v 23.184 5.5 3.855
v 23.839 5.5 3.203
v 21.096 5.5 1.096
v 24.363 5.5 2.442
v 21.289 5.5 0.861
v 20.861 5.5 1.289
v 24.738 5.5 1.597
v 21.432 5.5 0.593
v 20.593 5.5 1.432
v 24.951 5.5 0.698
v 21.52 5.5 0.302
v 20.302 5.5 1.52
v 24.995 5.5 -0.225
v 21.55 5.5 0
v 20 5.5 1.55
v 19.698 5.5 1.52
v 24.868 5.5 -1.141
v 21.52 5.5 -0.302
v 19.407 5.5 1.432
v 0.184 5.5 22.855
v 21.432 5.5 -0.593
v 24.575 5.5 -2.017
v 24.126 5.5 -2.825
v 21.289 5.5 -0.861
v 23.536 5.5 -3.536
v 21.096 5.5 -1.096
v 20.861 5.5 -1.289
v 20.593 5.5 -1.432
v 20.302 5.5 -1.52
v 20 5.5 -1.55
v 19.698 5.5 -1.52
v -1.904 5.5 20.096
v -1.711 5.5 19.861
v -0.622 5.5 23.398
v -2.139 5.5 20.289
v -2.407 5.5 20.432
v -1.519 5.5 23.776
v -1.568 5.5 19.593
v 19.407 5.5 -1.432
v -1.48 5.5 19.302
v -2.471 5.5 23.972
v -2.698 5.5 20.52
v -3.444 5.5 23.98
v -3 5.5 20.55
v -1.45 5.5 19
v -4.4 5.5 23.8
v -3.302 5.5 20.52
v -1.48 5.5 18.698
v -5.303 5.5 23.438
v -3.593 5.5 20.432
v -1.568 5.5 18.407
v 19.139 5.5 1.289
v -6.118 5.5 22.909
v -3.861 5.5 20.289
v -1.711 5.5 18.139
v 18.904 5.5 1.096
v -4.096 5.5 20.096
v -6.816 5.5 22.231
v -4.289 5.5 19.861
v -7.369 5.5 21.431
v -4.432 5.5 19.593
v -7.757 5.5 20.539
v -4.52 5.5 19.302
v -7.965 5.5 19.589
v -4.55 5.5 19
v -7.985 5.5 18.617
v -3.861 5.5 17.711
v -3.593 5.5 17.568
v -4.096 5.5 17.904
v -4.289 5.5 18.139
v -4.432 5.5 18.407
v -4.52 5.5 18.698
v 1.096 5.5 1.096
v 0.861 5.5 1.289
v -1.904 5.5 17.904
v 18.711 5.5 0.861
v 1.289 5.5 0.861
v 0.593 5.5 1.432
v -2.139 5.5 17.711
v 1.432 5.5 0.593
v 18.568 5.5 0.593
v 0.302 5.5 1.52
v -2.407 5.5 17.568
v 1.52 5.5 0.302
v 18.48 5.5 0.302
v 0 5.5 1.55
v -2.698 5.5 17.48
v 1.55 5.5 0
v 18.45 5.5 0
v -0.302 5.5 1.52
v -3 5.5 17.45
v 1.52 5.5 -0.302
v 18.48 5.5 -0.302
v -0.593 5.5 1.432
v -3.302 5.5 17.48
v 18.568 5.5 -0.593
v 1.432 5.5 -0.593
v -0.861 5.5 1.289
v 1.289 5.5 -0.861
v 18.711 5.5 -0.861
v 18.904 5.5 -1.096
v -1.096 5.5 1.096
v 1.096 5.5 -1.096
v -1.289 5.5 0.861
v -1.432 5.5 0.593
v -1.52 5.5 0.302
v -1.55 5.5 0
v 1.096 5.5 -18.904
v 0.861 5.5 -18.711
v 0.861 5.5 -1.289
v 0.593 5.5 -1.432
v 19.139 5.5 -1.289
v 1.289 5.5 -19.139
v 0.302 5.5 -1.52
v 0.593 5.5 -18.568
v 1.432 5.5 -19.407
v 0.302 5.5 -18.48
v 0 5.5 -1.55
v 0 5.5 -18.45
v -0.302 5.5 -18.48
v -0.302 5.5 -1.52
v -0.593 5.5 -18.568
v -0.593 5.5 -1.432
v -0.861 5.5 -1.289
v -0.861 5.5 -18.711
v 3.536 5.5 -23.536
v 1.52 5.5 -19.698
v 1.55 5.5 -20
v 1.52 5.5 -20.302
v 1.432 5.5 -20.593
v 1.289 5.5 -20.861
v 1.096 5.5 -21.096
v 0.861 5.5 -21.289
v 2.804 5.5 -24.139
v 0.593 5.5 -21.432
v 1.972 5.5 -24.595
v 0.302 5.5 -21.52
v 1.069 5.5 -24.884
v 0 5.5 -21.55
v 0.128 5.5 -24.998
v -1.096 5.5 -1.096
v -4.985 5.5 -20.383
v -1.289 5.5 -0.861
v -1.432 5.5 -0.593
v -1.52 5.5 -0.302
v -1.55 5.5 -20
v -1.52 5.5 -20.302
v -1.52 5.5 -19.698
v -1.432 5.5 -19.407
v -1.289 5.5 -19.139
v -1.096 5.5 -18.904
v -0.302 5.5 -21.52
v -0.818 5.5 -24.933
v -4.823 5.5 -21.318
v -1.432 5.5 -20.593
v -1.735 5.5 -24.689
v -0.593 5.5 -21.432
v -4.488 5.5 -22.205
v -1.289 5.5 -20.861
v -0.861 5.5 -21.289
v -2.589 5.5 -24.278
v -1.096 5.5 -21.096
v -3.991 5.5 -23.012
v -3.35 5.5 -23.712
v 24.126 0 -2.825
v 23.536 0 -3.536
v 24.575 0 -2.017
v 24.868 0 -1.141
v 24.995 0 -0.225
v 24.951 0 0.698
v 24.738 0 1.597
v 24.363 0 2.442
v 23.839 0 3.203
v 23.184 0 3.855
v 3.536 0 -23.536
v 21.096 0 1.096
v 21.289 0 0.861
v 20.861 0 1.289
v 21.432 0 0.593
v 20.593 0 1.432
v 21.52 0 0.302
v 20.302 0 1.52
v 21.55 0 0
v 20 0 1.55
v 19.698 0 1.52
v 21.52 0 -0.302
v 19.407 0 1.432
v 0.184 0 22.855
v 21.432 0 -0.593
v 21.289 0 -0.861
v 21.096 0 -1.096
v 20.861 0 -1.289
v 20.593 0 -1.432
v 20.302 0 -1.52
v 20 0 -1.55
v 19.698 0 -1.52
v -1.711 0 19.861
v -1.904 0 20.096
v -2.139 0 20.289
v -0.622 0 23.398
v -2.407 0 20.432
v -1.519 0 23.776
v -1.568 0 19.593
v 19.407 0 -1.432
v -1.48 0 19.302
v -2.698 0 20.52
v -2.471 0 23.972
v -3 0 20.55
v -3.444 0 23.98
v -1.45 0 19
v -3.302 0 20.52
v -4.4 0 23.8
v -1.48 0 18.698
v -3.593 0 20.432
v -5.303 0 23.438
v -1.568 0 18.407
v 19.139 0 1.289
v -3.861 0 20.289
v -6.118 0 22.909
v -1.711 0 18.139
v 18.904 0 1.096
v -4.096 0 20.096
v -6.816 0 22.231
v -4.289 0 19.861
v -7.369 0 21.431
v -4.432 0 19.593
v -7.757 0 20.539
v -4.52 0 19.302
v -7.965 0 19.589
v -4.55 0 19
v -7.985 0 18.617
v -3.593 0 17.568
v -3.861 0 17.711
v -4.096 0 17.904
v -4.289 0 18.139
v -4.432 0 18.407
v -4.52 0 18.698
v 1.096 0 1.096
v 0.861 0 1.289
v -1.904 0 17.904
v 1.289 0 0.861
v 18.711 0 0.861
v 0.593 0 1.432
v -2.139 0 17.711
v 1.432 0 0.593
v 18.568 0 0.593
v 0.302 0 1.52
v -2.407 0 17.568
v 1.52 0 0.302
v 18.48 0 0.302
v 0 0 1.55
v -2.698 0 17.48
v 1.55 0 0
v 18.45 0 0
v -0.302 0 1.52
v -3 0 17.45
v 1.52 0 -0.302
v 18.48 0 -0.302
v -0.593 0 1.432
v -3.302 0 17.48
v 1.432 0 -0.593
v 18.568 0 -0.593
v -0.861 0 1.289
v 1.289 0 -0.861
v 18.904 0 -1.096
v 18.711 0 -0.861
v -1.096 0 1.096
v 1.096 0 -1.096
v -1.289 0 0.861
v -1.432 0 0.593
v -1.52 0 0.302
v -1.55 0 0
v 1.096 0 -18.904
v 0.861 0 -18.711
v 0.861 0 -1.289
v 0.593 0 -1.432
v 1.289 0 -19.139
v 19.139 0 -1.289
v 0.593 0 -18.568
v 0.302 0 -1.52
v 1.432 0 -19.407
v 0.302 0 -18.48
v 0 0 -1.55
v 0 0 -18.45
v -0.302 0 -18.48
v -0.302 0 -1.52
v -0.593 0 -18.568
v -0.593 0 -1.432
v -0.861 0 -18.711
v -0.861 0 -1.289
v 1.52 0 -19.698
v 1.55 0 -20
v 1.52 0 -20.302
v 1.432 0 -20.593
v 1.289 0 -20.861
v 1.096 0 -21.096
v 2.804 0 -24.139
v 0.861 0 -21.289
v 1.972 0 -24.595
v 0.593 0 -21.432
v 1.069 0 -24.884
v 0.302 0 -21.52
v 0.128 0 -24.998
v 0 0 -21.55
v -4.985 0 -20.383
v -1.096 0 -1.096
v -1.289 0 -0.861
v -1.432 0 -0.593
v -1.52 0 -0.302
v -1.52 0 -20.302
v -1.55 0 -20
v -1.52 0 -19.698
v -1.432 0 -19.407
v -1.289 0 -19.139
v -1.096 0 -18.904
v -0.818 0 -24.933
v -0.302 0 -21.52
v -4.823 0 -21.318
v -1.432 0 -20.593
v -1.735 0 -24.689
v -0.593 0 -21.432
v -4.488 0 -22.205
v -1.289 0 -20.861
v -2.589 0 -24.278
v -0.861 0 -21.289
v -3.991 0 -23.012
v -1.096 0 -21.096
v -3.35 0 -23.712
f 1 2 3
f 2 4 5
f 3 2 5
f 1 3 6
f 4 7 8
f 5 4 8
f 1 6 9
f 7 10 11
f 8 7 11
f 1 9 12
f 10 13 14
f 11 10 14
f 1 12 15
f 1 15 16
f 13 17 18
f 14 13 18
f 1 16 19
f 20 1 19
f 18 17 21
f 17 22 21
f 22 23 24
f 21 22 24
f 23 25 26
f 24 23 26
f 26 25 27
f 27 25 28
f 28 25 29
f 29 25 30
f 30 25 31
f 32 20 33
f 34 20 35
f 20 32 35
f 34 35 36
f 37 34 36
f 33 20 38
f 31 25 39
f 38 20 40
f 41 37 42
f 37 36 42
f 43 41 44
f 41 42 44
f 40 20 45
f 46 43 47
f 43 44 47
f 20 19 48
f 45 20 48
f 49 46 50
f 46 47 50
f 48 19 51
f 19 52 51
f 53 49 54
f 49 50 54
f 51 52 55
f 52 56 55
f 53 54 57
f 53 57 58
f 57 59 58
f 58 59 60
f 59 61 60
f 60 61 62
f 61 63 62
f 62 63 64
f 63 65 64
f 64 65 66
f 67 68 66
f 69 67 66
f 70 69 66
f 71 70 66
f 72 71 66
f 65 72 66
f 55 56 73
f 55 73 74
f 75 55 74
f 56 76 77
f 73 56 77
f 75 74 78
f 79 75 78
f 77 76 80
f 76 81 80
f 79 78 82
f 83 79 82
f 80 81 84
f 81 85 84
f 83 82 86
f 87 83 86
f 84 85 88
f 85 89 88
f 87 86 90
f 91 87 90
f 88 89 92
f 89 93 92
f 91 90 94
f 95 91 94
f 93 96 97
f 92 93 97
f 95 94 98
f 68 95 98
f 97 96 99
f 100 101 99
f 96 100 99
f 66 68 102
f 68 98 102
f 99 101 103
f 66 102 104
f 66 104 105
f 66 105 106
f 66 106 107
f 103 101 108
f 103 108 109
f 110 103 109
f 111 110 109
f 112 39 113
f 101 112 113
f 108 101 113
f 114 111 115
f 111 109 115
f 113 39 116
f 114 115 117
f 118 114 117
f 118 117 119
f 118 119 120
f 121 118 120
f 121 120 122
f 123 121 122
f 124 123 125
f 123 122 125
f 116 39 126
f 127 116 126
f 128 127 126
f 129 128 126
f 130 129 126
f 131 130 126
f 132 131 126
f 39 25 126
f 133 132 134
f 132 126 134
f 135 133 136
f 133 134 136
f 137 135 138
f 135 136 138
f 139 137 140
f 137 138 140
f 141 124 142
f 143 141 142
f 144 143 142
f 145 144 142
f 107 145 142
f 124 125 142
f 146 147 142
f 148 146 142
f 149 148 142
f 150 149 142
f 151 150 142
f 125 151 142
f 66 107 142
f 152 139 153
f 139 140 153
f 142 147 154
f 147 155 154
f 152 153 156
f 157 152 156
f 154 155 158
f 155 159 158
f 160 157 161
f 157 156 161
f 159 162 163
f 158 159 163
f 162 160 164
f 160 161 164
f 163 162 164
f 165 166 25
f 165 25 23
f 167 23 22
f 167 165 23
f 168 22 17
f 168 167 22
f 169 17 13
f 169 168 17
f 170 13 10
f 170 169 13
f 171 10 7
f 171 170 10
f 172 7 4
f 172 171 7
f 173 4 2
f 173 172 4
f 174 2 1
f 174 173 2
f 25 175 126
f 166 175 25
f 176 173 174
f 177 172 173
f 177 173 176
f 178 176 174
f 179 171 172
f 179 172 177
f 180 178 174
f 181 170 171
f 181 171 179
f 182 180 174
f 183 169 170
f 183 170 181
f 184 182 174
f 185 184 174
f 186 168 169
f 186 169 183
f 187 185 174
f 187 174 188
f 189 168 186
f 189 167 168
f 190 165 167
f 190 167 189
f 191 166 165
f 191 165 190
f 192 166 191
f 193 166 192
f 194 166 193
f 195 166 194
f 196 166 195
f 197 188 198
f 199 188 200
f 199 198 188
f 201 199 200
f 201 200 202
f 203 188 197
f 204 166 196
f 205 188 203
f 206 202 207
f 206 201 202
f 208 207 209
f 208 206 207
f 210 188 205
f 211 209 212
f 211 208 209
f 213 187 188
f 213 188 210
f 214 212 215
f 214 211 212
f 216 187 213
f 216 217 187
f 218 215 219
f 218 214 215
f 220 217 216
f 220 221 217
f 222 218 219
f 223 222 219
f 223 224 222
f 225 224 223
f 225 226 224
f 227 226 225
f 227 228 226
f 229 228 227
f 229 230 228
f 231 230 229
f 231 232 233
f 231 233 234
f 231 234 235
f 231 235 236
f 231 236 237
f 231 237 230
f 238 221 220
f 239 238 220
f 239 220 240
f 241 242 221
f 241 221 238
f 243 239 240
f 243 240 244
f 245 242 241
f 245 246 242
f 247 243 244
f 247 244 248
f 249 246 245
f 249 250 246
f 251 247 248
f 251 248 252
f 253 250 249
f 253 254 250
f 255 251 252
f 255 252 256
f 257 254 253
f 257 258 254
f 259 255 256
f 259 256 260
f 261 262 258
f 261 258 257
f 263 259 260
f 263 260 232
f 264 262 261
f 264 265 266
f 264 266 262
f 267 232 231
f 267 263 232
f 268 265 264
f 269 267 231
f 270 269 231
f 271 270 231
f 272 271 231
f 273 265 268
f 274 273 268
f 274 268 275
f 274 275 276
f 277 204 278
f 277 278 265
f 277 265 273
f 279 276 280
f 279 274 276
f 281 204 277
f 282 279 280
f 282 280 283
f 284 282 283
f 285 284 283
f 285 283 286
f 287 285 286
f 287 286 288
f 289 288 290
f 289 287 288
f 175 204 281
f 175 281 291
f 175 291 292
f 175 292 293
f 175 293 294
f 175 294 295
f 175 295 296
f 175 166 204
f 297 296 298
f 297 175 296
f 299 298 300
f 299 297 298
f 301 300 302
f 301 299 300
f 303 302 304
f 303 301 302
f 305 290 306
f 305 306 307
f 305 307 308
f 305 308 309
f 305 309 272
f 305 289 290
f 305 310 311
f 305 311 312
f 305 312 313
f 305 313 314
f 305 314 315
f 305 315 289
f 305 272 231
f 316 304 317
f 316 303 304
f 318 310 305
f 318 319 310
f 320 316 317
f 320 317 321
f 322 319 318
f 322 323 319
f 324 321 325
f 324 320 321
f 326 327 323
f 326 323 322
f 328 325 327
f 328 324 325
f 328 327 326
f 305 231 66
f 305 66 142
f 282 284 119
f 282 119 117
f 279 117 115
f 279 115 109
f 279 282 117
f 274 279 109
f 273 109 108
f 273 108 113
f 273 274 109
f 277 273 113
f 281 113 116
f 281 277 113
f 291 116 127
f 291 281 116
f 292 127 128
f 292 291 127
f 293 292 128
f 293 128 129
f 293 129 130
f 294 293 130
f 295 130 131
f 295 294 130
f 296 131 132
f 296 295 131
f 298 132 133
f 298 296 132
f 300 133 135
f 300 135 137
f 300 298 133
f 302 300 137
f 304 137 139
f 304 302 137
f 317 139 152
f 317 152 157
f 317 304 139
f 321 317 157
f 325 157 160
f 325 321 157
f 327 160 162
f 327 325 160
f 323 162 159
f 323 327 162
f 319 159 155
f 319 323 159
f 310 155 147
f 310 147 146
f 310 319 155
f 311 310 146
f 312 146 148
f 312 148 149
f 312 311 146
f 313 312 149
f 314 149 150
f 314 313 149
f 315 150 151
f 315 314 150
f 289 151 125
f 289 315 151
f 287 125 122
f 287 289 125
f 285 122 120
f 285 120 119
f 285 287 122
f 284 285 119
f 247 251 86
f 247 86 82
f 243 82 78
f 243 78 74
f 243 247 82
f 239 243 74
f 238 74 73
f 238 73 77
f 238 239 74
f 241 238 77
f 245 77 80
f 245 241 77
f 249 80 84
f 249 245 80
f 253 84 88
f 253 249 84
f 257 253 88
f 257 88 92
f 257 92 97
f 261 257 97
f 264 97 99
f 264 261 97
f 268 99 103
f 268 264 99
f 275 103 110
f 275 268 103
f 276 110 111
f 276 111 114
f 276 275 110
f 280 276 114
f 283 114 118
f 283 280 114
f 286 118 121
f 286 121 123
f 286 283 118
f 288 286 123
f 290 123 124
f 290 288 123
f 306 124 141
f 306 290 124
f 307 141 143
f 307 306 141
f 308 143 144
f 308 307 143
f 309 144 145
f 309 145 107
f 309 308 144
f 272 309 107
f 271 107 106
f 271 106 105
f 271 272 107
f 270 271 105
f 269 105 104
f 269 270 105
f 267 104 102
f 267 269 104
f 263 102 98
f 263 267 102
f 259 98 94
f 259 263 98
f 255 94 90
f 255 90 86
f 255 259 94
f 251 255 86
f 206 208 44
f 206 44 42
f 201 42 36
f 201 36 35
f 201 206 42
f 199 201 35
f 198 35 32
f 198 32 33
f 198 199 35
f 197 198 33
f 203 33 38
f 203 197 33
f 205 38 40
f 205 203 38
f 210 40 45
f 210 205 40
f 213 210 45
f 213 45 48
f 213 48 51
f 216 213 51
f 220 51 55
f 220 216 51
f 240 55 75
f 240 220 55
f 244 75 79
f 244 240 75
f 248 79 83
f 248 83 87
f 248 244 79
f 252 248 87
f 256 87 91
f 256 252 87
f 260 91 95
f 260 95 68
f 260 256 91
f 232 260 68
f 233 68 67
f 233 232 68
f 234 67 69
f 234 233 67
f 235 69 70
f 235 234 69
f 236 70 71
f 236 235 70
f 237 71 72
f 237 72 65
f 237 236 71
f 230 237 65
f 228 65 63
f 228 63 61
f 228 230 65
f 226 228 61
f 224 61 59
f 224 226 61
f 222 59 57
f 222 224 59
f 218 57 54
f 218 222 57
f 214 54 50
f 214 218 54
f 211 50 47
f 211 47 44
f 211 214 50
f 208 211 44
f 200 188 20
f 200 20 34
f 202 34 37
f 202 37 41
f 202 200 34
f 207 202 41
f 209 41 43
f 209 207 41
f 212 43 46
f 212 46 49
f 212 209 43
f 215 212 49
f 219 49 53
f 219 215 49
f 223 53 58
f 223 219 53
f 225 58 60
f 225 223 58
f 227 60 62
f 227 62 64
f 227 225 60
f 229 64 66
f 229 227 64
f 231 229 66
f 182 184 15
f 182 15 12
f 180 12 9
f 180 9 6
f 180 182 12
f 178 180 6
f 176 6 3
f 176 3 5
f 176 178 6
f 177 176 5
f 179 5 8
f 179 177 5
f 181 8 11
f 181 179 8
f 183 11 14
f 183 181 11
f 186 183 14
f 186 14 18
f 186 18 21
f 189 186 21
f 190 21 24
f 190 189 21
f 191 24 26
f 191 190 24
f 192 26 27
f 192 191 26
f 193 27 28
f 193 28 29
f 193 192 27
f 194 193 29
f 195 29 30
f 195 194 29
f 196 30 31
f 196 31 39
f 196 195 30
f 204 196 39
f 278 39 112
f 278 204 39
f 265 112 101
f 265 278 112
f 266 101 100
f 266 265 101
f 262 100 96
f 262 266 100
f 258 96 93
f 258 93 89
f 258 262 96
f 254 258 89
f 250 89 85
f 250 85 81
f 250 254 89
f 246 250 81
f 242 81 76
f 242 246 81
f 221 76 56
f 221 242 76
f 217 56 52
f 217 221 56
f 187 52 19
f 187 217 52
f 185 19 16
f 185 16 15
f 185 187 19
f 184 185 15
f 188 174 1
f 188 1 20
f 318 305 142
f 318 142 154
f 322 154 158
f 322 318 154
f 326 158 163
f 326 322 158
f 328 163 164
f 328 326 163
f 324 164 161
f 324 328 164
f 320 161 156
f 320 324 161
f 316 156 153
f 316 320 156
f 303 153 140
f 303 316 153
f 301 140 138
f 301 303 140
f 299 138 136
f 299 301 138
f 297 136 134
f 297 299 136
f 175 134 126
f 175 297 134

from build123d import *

# Parameters (mm, degrees)
SKETCH_1_R      = 1.55
EXTRUDE_1_DEPTH = 5.5


with BuildPart() as part:
    # ｽｹｯﾁ1 → ﾎﾞｽ - 押し出し1 (new body)
    with BuildSketch(Plane(origin=(0, 0, 0), x_dir=(1, 0, 0), z_dir=(0, 1, 0))):
        with BuildLine():
            Line((-7.985272428, -18.616517506), (-4.985272428, 20.383482494))
            ThreePointArc((-4.985272428, 20.383482494), (-1.734731239, 24.689425075), (3.535533906, 23.535533906))
            Line((3.535533906, 23.535533906), (23.535533906, 3.535533906))
            ThreePointArc((23.535533906, 3.535533906), (24.994366167, -0.237290102), (23.184407235, -3.854808758))
            Line((23.184407235, -3.854808758), (0.184407235, -22.854808758))
            ThreePointArc((0.184407235, -22.854808758), (-5.302511031, -23.438292797), (-7.985272428, -18.616517506))
        make_face()
        with Locations(Location((0, 20, 0), (0, 0, 270))):
            Circle(SKETCH_1_R, mode=Mode.SUBTRACT)
        with Locations(Location((0, 0, 0), (0, 0, 270))):
            Circle(SKETCH_1_R, mode=Mode.SUBTRACT)
        with Locations(Location((20, 0, 0), (0, 0, 270))):
            Circle(SKETCH_1_R, mode=Mode.SUBTRACT)
        with Locations(Location((-3, -19, 0), (0, 0, 270))):
            Circle(SKETCH_1_R, mode=Mode.SUBTRACT)
    extrude(amount=EXTRUDE_1_DEPTH)


solid = part.part
